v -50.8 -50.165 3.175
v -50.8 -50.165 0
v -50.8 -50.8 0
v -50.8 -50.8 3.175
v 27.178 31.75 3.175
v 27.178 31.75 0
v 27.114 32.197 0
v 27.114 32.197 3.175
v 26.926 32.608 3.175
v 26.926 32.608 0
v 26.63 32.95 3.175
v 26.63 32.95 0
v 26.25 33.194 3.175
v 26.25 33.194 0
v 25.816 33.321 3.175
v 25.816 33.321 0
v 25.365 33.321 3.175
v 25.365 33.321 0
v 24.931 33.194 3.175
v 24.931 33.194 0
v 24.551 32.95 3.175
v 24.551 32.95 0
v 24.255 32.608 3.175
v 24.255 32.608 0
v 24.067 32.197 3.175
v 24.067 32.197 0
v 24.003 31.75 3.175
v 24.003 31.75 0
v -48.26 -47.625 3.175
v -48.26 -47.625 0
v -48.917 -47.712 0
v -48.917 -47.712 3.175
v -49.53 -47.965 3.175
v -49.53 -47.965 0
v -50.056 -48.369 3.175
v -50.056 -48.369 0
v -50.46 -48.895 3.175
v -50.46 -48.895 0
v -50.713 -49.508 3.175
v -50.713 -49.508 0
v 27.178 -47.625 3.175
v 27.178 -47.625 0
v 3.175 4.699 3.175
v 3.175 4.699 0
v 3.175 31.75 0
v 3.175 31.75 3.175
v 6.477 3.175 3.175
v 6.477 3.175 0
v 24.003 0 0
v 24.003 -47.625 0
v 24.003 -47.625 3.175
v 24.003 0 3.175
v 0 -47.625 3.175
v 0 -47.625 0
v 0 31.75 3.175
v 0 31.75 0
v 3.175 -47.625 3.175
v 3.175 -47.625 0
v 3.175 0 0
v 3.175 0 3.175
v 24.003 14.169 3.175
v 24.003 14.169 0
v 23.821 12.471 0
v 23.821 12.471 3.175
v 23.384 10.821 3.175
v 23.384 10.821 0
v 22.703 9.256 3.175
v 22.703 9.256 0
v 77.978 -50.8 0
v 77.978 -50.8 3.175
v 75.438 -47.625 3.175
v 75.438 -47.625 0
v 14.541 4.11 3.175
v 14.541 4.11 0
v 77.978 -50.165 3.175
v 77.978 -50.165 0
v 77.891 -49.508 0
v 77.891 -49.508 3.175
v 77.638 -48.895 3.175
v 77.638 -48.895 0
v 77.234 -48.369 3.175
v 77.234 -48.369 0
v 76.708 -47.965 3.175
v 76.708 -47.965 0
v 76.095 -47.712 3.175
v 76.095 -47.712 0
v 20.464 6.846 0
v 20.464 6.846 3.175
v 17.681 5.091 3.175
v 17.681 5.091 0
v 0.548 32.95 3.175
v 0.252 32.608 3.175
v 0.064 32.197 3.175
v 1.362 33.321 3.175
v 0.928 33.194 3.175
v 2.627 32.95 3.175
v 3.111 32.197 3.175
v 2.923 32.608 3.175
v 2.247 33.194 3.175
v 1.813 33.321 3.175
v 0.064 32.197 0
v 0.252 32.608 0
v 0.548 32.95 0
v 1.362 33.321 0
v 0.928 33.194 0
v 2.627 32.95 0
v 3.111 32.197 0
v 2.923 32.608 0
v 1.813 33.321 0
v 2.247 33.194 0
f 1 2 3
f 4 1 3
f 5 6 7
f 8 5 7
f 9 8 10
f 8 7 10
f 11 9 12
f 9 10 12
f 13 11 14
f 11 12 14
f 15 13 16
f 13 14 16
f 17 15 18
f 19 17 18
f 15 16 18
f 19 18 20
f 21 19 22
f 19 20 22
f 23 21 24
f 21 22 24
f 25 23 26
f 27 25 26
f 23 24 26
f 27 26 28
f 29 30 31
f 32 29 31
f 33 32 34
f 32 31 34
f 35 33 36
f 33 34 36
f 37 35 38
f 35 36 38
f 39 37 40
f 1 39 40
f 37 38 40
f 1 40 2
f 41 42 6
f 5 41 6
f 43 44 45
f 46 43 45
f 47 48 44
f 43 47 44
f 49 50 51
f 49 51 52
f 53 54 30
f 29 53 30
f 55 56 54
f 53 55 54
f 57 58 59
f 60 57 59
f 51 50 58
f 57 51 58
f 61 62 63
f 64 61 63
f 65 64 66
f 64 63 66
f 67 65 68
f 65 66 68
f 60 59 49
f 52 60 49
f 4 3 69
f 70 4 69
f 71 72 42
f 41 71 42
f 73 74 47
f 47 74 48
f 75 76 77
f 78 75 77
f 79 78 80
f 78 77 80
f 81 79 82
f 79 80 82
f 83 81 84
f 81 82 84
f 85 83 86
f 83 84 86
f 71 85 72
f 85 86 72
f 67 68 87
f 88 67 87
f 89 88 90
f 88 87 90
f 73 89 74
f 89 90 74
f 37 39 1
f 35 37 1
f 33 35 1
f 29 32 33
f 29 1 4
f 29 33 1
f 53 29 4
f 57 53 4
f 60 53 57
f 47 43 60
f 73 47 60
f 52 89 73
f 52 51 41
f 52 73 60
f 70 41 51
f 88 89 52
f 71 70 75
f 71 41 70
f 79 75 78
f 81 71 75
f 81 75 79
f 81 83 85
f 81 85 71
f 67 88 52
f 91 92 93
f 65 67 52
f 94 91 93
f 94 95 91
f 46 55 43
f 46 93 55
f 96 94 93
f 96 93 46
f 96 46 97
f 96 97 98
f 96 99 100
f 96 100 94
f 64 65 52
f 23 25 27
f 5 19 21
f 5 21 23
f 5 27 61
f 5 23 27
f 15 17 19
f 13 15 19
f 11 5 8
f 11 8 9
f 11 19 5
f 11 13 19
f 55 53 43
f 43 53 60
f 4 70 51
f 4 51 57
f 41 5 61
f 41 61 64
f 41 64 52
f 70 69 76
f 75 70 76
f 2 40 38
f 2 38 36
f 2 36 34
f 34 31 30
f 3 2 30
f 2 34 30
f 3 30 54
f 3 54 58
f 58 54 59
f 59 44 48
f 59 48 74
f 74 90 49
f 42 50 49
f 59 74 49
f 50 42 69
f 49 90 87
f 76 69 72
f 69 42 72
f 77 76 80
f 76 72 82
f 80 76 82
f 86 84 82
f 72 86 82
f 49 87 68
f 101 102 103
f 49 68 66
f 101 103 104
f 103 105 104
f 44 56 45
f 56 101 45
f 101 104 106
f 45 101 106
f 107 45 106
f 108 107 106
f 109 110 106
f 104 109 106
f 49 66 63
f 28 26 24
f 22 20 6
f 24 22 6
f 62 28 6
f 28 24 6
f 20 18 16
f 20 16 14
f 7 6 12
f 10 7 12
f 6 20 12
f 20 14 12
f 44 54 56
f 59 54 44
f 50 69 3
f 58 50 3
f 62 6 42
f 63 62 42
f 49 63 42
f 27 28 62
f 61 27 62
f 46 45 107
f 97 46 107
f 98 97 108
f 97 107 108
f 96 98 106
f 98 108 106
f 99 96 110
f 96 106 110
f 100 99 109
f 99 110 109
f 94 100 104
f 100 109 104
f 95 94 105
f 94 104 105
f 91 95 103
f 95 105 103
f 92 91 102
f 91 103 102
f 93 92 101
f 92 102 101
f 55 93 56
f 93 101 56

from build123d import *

# Parameters (mm, degrees)
F0_W     = 3.175
F0_H     = 47.625
F1_DEPTH = 3.175


with BuildPart() as f1:
    # F0 (on Top) → F1 (new body)
    with BuildSketch(Plane.XY):
        with BuildLine():
            Line((0, 31.75), (0, 0))
            Line((0, 0), (3.175, 0))
            Line((3.175, 0), (24.003, 0))
            Line((24.003, 0), (27.178, 0))
            Line((27.178, 0), (27.178, 31.75))
            ThreePointArc((27.178, 31.75), (25.5905, 33.3375), (24.003, 31.75))
            Line((24.003, 31.75), (24.003, 14.16871))
            Line((24.003, 14.16871), (24.003, 11.557))
            Line((24.003, 11.557), (24.003, 5.207))
            Line((24.003, 5.207), (24.003, 3.175))
            Line((24.003, 3.175), (6.477, 3.175))
            Line((6.477, 3.175), (3.175, 3.175))
            Line((3.175, 3.175), (3.175, 4.699))
            Line((3.175, 4.699), (3.175, 31.75))
            ThreePointArc((3.175, 31.75), (1.5875, 33.3375), (0, 31.75))
        make_face()
        with Locations((1.5875, -23.8125)):
            Rectangle(F0_W, F0_H)
        Polygon((3.175, -47.625), (0, -47.625), (0, -50.8), (27.178, -50.8), (27.178, -47.625), (24.003, -47.625), align=None)
        with BuildLine():
            Line((0, -50.8), (0, -47.625))
            Line((0, -47.625), (-48.26, -47.625))
            ThreePointArc((-48.26, -47.625), (-50.056051, -48.368949), (-50.8, -50.165))
            Line((-50.8, -50.165), (-50.8, -50.8))
            Line((-50.8, -50.8), (0, -50.8))
        make_face()
        with Locations((25.5905, -23.8125)):
            Rectangle(F0_W, F0_H)
        Polygon((6.477, 3.175), (3.175, 4.699), (3.175, 3.175), align=None)
        with BuildLine():
            Line((27.178, -47.625), (27.178, -50.8))
            Line((27.178, -50.8), (77.978, -50.8))
            Line((77.978, -50.8), (77.978, -50.165))
            ThreePointArc((77.978, -50.165), (77.234051, -48.368949), (75.438, -47.625))
            Line((75.438, -47.625), (27.178, -47.625))
        make_face()
        Polygon((14.541382, 4.110001), (6.477, 3.175), (24.003, 3.175), (24.003, 5.207), align=None)
        with BuildLine():
            ThreePointArc((22.702671, 9.255895), (19.129717, 5.877759), (14.541382, 4.110001))
            Line((14.541382, 4.110001), (24.003, 5.207))
            Line((24.003, 5.207), (24.003, 11.557))
            ThreePointArc((24.003, 11.557), (23.412861, 10.372528), (22.702671, 9.255895))
        make_face()
        with BuildLine():
            ThreePointArc((24.003, 14.16871), (23.633619, 11.637984), (22.702671, 9.255895))
            ThreePointArc((22.702671, 9.255895), (23.412861, 10.372528), (24.003, 11.557))
            Line((24.003, 11.557), (24.003, 14.16871))
        make_face()
    extrude(amount=F1_DEPTH)


solid = f1.part
